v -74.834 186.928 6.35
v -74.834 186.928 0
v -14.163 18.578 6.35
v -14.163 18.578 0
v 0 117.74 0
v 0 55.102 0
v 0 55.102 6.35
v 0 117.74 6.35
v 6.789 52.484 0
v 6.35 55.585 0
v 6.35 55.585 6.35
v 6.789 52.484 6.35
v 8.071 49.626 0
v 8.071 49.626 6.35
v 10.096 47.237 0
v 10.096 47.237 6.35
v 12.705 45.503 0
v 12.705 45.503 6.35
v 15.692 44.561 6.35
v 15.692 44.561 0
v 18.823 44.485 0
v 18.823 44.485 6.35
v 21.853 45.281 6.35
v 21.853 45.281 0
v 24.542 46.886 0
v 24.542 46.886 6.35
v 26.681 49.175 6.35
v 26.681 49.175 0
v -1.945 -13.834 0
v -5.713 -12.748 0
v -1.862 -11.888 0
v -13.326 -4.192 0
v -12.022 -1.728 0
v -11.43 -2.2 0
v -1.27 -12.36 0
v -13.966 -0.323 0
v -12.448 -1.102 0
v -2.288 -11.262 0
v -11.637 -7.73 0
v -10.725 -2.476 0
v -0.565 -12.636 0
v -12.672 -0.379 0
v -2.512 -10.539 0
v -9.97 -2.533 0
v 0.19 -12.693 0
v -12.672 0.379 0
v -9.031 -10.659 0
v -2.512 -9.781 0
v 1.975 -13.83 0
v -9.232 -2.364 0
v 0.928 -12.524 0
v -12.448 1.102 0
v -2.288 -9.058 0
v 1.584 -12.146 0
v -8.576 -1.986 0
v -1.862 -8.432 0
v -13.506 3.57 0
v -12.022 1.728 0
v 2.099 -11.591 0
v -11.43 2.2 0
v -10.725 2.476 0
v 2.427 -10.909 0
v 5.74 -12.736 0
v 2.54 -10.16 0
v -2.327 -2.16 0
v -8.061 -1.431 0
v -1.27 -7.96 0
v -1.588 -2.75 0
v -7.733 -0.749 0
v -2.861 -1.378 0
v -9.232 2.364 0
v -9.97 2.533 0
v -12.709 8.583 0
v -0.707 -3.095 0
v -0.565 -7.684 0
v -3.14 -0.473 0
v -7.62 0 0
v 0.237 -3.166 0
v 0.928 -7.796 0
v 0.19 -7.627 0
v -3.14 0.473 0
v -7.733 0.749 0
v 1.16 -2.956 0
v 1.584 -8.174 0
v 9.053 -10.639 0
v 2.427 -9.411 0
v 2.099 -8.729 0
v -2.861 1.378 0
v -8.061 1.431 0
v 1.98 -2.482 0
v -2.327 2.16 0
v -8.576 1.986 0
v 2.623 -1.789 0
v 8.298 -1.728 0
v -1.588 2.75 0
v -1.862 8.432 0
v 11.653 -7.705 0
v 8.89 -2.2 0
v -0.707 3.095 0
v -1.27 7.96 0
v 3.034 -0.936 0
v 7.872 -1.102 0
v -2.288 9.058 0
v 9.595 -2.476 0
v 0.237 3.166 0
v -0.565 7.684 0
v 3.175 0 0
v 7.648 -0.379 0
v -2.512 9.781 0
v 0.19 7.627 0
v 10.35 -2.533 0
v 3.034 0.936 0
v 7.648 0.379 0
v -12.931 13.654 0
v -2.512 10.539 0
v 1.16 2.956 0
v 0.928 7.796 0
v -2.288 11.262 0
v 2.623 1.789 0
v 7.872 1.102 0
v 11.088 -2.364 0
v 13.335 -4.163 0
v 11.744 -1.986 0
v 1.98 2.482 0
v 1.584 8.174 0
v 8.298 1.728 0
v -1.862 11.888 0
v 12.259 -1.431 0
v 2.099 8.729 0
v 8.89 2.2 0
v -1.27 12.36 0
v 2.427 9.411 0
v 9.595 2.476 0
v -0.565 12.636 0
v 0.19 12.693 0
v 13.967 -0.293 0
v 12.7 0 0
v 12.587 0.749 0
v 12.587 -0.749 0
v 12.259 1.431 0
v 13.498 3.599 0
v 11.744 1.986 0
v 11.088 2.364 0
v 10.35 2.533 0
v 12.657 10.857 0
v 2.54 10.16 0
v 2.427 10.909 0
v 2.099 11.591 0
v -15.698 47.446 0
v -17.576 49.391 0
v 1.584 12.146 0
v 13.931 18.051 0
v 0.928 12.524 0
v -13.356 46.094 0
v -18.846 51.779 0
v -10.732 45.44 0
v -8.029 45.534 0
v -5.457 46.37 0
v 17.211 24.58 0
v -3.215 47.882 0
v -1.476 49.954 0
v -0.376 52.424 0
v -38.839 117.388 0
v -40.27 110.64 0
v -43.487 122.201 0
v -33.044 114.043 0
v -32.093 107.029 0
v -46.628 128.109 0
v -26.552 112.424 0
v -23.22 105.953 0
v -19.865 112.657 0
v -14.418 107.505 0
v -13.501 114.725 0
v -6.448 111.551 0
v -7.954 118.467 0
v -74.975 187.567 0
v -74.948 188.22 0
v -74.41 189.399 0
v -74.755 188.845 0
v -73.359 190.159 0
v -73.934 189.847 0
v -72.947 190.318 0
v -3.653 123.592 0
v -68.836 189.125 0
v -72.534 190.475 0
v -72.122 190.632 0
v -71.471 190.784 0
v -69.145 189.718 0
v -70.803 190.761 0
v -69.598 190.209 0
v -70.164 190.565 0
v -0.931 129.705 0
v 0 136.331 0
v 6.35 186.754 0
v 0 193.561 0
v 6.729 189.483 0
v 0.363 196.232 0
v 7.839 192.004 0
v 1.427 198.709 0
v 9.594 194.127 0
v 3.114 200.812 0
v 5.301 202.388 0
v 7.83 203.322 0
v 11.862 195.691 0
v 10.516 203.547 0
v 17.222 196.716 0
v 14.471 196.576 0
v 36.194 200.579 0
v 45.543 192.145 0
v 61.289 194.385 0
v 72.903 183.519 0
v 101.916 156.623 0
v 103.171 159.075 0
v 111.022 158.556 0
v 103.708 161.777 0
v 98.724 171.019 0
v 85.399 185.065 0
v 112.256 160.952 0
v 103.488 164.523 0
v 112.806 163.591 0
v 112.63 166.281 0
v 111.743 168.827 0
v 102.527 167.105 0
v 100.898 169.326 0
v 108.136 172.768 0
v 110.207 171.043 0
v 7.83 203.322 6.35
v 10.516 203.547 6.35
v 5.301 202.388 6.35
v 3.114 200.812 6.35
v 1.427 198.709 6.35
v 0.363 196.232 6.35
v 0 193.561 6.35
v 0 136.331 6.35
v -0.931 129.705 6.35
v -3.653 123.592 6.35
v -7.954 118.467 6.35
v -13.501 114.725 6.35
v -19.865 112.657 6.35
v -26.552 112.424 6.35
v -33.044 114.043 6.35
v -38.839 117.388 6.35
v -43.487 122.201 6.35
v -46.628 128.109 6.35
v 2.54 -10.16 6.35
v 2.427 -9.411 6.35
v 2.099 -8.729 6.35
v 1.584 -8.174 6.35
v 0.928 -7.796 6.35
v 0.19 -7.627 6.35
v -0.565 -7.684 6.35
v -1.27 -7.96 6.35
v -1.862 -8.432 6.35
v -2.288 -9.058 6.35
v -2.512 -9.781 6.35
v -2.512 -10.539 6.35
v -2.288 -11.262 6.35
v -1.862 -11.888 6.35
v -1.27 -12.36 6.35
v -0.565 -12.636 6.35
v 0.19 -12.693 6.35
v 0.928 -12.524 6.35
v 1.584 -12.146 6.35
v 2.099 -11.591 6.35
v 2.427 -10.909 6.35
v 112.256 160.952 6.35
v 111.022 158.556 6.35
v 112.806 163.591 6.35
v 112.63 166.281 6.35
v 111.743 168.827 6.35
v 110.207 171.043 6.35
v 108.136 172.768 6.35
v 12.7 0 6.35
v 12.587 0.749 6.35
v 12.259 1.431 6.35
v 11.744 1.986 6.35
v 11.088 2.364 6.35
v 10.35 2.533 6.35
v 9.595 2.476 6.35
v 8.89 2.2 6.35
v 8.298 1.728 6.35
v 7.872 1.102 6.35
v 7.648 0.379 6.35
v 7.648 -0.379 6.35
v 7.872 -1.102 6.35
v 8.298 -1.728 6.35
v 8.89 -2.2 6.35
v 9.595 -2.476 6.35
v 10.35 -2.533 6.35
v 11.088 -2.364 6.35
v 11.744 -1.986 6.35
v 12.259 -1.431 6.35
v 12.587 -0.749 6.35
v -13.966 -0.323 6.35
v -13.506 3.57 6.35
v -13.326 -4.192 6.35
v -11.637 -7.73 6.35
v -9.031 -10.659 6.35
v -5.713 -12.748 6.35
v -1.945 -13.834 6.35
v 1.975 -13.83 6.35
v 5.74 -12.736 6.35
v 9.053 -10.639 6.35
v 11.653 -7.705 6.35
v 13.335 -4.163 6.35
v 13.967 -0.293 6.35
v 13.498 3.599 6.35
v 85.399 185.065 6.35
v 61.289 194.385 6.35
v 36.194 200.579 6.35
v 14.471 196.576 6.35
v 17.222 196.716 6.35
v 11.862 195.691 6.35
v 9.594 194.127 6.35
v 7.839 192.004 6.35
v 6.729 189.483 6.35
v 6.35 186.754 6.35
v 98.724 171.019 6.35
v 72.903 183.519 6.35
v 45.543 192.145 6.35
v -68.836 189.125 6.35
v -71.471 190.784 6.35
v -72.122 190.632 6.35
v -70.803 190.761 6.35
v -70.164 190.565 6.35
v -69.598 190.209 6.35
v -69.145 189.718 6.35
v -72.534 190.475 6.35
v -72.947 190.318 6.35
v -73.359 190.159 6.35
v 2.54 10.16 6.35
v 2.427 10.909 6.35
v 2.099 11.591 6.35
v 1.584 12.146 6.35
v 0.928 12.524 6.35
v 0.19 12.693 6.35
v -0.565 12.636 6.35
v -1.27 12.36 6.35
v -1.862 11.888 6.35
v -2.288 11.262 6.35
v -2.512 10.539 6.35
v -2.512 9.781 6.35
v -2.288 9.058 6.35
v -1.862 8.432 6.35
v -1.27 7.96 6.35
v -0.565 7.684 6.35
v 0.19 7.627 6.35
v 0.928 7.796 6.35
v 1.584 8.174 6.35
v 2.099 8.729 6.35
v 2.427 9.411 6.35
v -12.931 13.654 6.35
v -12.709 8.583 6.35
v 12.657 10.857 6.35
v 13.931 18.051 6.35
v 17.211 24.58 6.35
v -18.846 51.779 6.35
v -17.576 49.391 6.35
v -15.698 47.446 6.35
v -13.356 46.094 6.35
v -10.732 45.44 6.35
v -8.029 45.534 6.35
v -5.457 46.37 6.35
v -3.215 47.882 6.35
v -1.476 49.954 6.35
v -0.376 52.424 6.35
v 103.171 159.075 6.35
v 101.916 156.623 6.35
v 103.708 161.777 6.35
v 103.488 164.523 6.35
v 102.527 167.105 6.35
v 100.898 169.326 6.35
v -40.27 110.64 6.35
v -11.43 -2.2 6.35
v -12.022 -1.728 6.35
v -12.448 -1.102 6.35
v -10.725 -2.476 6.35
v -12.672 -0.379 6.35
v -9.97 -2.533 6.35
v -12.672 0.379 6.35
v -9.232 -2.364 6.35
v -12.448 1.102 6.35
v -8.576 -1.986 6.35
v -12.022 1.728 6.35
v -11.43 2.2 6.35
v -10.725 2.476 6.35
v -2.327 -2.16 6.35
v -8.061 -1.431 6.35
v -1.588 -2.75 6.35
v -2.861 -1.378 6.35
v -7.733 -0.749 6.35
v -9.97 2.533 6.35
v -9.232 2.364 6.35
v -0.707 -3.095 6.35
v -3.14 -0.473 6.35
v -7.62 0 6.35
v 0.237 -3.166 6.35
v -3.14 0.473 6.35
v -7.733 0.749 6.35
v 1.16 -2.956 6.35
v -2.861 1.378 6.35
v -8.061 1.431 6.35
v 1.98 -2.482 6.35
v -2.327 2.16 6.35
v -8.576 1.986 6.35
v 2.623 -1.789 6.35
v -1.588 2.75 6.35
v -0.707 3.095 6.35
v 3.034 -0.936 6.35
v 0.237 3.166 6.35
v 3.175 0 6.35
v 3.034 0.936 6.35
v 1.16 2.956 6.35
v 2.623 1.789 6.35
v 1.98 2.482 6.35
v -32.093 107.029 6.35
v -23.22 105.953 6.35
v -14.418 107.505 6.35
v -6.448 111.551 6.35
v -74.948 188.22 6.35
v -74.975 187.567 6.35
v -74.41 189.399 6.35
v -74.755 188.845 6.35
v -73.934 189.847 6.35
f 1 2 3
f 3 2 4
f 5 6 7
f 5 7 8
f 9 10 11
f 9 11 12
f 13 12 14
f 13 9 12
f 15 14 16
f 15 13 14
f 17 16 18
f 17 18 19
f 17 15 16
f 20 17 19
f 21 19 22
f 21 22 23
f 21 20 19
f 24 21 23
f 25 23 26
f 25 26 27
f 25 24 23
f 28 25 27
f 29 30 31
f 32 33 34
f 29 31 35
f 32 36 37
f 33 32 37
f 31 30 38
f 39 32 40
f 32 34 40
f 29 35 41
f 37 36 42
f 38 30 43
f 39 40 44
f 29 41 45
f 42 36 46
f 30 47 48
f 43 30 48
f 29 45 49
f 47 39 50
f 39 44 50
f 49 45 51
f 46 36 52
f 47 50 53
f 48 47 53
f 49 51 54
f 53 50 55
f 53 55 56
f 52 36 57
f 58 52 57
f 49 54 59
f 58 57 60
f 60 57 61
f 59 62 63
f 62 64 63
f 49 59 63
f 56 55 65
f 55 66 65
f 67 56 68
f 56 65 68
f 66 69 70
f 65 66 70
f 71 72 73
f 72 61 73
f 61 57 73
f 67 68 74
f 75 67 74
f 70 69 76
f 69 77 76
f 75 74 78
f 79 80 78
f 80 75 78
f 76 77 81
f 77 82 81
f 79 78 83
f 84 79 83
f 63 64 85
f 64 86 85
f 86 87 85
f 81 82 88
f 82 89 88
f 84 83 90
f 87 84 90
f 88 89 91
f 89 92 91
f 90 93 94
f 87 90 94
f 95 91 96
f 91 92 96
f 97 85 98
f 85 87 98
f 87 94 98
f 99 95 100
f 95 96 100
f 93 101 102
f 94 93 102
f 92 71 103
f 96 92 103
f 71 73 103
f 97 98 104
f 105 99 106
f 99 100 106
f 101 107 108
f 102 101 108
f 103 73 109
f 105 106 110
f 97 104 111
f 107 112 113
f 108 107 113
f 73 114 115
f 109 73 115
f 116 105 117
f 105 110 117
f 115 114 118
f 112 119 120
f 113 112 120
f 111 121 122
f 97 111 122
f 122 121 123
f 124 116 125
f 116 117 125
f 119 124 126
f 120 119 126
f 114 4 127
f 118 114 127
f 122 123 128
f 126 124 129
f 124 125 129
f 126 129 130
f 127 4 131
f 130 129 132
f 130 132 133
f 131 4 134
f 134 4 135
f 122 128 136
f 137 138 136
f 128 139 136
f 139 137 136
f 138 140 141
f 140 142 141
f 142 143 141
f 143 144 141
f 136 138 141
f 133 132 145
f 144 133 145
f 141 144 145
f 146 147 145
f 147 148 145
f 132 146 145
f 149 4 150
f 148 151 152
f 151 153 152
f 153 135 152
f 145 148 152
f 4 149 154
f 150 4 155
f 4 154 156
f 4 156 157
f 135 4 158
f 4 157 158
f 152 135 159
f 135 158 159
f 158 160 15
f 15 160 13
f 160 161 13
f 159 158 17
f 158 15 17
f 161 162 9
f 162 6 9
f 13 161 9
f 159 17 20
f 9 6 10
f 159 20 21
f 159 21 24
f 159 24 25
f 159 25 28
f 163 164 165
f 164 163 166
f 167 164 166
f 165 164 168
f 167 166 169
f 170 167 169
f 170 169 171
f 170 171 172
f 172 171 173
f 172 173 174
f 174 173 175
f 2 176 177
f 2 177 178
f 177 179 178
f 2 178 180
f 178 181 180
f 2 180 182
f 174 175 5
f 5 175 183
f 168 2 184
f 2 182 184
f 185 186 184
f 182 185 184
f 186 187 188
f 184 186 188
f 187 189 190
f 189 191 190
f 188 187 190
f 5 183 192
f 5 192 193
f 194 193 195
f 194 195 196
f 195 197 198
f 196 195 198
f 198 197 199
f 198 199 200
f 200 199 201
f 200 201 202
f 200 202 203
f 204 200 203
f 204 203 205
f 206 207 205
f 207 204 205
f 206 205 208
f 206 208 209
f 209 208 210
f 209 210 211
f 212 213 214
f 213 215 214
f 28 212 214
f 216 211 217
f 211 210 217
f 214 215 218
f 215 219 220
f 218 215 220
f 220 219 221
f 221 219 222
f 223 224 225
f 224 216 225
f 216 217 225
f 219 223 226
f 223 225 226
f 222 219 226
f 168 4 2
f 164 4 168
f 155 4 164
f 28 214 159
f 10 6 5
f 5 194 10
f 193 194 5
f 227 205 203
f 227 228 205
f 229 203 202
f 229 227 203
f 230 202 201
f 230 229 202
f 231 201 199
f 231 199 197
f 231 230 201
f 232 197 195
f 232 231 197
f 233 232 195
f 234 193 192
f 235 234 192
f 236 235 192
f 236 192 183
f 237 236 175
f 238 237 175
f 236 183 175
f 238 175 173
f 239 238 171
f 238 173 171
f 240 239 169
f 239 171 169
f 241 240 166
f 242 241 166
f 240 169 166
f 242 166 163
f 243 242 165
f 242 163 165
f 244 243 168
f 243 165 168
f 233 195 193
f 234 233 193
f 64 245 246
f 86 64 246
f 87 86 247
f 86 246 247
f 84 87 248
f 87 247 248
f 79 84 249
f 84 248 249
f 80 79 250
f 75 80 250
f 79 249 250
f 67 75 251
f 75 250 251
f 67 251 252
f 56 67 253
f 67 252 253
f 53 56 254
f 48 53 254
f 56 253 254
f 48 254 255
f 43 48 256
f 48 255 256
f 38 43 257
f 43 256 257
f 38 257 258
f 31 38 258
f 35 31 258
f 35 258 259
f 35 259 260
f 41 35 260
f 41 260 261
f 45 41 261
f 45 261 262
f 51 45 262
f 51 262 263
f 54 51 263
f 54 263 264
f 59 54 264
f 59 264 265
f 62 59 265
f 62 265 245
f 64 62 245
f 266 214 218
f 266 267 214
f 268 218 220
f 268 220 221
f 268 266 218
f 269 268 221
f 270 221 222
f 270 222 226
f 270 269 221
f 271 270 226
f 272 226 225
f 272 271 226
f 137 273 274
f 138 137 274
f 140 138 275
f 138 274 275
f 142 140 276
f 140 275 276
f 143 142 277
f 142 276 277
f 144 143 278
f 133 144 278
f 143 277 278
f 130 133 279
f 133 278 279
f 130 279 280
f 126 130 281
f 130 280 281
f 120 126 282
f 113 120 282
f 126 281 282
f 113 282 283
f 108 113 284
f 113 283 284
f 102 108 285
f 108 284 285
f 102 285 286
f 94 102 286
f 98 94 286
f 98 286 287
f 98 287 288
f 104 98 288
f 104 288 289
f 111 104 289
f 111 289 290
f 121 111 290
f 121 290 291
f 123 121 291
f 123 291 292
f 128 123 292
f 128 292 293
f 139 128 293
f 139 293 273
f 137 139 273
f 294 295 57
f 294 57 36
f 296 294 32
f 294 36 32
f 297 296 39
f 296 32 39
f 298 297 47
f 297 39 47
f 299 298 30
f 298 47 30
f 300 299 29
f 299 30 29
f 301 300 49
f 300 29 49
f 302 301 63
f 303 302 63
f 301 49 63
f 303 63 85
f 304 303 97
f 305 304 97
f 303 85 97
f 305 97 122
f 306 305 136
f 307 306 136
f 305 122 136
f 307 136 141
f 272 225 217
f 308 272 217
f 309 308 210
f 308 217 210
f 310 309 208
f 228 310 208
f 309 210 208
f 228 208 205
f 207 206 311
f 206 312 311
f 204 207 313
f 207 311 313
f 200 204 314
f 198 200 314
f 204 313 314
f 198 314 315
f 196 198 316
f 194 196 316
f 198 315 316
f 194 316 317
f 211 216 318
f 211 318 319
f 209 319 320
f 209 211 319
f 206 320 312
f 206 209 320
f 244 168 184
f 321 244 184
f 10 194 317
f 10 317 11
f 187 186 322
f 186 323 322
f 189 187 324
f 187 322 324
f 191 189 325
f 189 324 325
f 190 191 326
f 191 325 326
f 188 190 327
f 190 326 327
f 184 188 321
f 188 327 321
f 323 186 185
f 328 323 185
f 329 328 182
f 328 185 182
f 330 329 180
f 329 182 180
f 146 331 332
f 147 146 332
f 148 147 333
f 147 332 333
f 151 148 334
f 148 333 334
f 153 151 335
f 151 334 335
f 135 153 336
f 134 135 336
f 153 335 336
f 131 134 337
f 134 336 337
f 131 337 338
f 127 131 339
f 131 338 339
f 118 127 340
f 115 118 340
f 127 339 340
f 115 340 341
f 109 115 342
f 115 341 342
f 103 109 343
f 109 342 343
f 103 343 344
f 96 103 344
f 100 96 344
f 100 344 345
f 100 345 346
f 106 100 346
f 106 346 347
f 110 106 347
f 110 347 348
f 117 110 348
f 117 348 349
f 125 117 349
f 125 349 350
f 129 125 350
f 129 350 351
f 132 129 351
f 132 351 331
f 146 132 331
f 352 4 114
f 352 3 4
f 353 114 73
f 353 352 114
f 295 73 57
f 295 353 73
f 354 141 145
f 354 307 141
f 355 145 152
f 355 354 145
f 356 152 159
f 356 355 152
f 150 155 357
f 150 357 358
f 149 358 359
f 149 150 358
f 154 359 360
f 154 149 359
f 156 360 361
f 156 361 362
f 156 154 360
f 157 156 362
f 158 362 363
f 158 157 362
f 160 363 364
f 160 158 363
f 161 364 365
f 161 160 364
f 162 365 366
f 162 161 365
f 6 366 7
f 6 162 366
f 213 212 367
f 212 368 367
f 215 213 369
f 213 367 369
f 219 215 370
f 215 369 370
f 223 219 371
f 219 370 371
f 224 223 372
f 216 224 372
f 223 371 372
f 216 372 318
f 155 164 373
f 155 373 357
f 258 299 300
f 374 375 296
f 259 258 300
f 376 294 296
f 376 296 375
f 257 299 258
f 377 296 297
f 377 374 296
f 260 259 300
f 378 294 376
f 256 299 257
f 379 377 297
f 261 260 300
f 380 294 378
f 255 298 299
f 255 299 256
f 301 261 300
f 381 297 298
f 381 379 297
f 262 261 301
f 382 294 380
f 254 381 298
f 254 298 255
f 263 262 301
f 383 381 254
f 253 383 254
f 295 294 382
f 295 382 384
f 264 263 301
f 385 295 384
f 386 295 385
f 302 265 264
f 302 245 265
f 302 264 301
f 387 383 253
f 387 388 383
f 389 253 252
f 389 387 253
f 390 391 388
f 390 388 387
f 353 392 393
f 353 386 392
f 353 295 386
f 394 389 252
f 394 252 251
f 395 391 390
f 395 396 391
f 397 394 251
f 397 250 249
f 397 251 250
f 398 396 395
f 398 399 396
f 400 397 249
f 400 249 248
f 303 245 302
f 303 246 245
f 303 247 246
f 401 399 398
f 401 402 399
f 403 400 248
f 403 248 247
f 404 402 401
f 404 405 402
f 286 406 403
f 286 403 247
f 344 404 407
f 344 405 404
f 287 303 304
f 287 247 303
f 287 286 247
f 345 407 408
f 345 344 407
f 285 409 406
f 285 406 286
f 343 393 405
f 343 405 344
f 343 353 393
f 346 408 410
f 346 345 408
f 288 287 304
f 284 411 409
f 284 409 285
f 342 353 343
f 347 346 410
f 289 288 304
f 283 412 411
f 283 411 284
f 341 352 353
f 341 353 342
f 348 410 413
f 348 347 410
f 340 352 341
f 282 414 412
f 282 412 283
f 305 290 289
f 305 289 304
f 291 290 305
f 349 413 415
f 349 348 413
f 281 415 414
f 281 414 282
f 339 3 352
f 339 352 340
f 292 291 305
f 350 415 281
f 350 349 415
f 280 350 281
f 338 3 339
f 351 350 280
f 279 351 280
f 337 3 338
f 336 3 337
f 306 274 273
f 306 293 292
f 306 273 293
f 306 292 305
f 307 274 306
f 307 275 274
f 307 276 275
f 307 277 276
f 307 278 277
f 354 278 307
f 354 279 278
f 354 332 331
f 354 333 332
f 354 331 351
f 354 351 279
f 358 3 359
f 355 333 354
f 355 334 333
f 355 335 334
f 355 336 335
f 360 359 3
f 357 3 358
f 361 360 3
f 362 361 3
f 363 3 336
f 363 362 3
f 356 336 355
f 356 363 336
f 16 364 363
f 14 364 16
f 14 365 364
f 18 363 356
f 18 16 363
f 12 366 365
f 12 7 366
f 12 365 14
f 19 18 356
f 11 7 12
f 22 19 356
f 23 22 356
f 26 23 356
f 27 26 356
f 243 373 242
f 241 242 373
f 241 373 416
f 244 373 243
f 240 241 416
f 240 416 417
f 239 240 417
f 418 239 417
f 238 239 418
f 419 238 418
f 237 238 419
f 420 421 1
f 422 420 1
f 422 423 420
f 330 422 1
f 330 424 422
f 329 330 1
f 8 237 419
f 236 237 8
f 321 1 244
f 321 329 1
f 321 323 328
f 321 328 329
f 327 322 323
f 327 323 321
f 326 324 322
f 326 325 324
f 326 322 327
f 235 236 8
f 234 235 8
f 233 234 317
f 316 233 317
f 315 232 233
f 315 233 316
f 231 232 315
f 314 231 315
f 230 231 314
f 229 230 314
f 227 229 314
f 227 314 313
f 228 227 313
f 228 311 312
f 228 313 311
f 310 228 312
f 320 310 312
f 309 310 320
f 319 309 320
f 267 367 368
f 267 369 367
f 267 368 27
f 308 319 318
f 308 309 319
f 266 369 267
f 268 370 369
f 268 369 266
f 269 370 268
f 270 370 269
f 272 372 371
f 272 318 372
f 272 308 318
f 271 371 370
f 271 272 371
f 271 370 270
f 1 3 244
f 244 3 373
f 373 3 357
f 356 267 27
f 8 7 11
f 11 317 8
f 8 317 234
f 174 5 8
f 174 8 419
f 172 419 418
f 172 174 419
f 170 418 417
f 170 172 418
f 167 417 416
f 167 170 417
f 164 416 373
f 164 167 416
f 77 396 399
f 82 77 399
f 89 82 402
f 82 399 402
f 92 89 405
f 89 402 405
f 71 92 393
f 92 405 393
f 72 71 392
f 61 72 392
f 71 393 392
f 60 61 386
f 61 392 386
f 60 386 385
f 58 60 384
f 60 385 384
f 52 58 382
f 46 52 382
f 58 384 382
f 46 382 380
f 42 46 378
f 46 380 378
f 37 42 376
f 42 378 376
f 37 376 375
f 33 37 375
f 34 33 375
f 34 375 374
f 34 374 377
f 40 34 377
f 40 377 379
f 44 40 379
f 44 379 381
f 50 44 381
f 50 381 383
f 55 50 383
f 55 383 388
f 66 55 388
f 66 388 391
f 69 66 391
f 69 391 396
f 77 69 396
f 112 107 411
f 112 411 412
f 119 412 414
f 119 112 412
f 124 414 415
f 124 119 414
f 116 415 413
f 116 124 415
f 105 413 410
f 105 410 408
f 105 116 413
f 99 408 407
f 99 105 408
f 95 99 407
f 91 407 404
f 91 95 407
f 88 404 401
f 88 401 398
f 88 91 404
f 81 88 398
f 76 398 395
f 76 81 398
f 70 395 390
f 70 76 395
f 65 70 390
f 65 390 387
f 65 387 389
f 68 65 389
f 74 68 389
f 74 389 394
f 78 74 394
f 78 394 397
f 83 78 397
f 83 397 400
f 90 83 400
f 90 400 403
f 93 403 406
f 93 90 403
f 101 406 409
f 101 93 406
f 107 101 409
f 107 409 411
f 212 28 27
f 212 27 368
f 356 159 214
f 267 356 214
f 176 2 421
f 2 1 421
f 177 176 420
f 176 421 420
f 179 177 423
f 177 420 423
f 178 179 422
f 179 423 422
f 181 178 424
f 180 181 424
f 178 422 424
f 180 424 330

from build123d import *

# Parameters (mm, degrees)
SKETCH1_R          = 3.175
BASE_EXTRUDE_DEPTH = 6.35
FILLET1_R          = 10
FILLET2_R          = 2.54
SKETCH2_R          = 2.54
MOUNT_HOLES_DEPTH  = 233.825979653
FILLET3_R          = 25.24


with BuildPart() as part:
    # Sketch1 → Base Extrude (new body)
    with BuildSketch(Plane.XY):
        with BuildLine():
            Line((-75.671499827, 189.250953956), (-10.702976856, 8.978150501))
            ThreePointArc((-10.702976856, 8.978150501), (1.824481313, -13.850349019), (8.012862816, 11.443554059))
            Line((8.012862816, 11.443554059), (116.905655655, 166.9585791))
            ThreePointArc((116.905655655, 166.9585791), (61.289492424, 194.385435611), (0, 203.818790741))
            Line((0, 203.818790741), (0, 136.3309927))
            ThreePointArc((0, 136.3309927), (-19.864532894, 112.657364258), (-46.627945663, 128.109227825))
            Line((-46.627945663, 128.109227825), (-69.710132022, 191.527013637))
            ThreePointArc((-69.710132022, 191.527013637), (-72.699723739, 190.4123148), (-75.671499827, 189.250953956))
        make_face()
        Circle(SKETCH1_R, mode=Mode.SUBTRACT)
        with BuildLine():
            Line((26.680843247, 49.175080254), (108.003253412, 165.315518235))
            ThreePointArc((108.003253412, 165.315518235), (59.380010597, 188.329332974), (6.35, 197.366665921))
            Line((6.35, 197.366665921), (6.35, 55.585370506))
            ThreePointArc((6.35, 55.585370506), (14.165311985, 44.926629865), (26.680843247, 49.175080254))
        make_face(mode=Mode.SUBTRACT)
        with BuildLine():
            Line((0, 55.102439922), (0, 117.740251175))
            ThreePointArc((0, 117.740251175), (-18.761866966, 106.403835026), (-40.269537582, 110.639645198))
            Line((-40.269537582, 110.639645198), (-18.8461444, 51.779356182))
            ThreePointArc((-18.8461444, 51.779356182), (-8.02887303, 45.534001644), (0, 55.102439922))
        make_face(mode=Mode.SUBTRACT)
    extrude(amount=BASE_EXTRUDE_DEPTH)

    # Fillet1
    fillet1_edges = [part.edges().sort_by_distance(p)[0] for p in [
        (0, 203.818790741, 3.175),
        (116.905655655, 166.9585791, 3.175),
        (108.003253412, 165.315518235, 3.175),
        (6.35, 197.366665921, 3.175),
    ]]
    fillet(fillet1_edges, radius=FILLET1_R)

    # Fillet2
    fillet2_edges = [part.edges().sort_by_distance(p)[0] for p in [
        (-75.671499827, 189.250953956, 3.175),
        (-69.710132022, 191.527013637, 3.175),
    ]]
    fillet(fillet2_edges, radius=FILLET2_R)

    # Sketch2 → Mount Holes (cut, through all)
    with BuildSketch(Plane.XY.offset(6.35)):
        with Locations((0, 10.16)):
            Circle(SKETCH2_R)
        with Locations((10.16, 0)):
            Circle(SKETCH2_R)
        with Locations((0, -10.16)):
            Circle(SKETCH2_R)
        with Locations((-10.16, 0)):
            Circle(SKETCH2_R)
    extrude(amount=-MOUNT_HOLES_DEPTH, mode=Mode.SUBTRACT)

    # Fillet3
    fillet3_edges = [part.edges().sort_by_distance(p)[0] for p in [
        (8.012862816, 11.443554059, 3.175),
        (-10.702976856, 8.978150501, 3.175),
    ]]
    fillet(fillet3_edges, radius=FILLET3_R)


solid = part.part
